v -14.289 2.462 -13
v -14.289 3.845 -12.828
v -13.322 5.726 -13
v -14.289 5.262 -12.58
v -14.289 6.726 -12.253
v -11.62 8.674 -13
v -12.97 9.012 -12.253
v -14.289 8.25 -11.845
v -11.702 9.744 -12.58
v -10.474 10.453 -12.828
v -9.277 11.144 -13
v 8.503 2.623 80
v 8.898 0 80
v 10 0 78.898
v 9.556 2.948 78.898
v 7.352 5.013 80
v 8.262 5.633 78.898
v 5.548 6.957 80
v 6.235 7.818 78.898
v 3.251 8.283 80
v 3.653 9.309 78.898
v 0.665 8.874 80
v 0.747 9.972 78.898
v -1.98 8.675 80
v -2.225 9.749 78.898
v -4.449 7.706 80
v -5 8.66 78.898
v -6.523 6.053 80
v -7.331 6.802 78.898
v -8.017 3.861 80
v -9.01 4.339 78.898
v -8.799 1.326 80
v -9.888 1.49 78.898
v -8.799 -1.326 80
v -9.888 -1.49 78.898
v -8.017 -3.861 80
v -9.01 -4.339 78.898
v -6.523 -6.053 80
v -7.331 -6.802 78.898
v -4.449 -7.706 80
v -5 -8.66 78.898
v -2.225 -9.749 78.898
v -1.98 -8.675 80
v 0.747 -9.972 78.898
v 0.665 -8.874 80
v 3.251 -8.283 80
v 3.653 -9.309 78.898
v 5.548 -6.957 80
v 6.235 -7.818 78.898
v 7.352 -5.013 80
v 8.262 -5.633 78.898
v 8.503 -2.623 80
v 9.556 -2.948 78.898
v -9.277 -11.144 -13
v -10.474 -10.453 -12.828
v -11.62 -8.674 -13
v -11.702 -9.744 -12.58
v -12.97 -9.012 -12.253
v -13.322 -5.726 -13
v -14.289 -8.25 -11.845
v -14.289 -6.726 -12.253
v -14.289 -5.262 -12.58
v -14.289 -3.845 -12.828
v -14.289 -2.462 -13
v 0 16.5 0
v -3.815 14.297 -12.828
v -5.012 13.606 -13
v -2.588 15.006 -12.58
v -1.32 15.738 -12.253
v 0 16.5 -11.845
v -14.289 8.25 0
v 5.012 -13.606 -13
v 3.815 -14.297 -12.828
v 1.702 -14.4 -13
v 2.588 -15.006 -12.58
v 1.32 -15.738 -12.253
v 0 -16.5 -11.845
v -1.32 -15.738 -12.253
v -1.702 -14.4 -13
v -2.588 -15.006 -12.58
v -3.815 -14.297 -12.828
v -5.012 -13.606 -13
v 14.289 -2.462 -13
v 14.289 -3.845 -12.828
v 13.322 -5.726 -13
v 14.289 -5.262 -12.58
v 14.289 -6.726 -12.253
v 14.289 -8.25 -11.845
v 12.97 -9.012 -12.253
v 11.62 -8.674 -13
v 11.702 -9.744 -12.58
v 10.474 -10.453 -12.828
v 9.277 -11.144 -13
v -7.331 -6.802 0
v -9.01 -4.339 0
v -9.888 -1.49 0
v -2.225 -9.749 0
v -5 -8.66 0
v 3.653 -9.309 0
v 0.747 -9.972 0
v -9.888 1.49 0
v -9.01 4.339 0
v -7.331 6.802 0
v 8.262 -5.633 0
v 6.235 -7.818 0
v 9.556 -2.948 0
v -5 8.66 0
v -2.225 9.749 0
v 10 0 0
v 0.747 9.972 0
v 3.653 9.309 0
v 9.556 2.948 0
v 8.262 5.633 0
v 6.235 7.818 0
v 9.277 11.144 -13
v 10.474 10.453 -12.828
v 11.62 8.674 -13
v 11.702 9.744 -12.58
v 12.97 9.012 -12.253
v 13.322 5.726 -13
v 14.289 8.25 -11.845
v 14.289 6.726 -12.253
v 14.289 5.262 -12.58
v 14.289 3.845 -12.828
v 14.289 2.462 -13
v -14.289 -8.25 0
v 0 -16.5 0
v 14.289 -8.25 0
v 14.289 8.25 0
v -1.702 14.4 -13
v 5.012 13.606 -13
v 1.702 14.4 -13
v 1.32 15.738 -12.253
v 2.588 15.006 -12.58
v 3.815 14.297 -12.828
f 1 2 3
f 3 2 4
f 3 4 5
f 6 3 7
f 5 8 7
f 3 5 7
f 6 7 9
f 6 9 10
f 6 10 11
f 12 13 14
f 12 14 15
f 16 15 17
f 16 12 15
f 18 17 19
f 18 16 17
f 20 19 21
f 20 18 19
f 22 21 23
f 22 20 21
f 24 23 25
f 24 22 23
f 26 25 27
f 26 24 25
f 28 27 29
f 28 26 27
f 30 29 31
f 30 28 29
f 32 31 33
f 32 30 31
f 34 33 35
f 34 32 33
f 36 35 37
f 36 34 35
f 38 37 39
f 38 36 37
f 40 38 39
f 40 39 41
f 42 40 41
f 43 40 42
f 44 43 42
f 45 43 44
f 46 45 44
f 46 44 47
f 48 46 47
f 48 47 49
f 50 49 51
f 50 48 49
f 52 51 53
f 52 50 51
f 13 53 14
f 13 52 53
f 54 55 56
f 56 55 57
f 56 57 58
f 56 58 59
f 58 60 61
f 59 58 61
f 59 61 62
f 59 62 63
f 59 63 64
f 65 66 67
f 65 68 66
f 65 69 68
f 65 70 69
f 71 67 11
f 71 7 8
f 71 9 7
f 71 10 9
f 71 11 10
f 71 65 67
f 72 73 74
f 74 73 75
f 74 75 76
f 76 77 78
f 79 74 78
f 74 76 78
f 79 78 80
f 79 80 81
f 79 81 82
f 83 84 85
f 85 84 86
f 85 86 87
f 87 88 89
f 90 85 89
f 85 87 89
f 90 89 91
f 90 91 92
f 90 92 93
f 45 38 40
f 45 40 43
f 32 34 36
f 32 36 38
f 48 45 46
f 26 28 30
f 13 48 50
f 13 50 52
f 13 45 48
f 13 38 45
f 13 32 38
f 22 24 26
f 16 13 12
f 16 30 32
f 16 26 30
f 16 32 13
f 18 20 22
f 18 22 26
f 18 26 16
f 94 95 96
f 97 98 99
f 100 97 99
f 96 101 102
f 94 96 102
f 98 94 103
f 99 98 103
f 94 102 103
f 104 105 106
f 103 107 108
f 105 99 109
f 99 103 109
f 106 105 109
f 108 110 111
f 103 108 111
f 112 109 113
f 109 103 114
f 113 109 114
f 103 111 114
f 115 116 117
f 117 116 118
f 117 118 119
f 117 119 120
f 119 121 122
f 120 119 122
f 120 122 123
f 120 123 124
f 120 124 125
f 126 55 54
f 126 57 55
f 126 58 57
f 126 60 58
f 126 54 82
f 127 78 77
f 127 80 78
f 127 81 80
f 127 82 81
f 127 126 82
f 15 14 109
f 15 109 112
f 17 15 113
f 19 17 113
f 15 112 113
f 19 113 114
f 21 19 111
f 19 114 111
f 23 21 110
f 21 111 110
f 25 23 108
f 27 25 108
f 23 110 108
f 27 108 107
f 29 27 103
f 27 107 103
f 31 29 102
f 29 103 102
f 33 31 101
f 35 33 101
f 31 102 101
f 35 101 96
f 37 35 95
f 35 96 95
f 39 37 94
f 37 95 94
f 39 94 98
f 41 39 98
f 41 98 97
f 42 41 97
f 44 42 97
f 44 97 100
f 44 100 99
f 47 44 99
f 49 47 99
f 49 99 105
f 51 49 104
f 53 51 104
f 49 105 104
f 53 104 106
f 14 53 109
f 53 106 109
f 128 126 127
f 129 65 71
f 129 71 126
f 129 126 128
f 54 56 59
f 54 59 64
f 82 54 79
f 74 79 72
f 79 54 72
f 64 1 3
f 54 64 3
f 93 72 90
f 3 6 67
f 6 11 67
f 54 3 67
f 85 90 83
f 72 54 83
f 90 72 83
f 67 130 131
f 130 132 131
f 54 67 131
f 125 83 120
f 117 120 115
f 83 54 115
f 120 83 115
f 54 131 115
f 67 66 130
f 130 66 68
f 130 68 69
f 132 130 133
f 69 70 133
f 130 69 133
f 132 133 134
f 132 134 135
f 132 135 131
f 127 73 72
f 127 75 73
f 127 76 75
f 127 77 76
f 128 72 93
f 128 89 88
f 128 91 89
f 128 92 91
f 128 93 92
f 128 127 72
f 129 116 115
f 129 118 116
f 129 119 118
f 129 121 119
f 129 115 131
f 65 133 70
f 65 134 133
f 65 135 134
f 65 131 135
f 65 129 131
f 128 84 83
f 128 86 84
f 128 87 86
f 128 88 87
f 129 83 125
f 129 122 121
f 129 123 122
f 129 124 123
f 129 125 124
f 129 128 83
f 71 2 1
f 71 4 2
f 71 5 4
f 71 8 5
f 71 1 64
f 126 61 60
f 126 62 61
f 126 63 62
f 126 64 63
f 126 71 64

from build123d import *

# Parameters (mm, degrees)
SKETCH_1_R      = 10
EXTRUDE_1_DEPTH = 80
EXTRUDE_2_DEPTH = 13
CHAMFER_1_SIZE  = 1.1015


with BuildPart() as part:
    # Эскиз1 → Бобышка-Вытянуть1 (new body)
    with BuildSketch(Plane.XY):
        Circle(SKETCH_1_R)
    extrude(amount=EXTRUDE_1_DEPTH)

    # Фаска1
    chamfer_1_edges = [part.edges().sort_by_distance(p)[0] for p in [
        (-10, 0, 80),
    ]]
    chamfer(chamfer_1_edges, length=CHAMFER_1_SIZE)


with BuildPart() as body_2:
    # Эскиз1<4> → Бобышка-Вытянуть2 (new body)
    with BuildSketch(Plane.XY):
        Polygon((0, 16.5), (-14.289419162, 8.25), (-14.289419162, -8.25), (0, -16.5), (14.289419162, -8.25), (14.289419162, 8.25), align=None)
    extrude(amount=-EXTRUDE_2_DEPTH)

    # Эскиз3 → Вырез-Повернуть1 (revolve, cut)
    with BuildSketch(Plane(origin=(0, 0, 0), x_dir=(0, 0, -1), z_dir=(1, 0, 0))):
        Polygon((13, 24.5), (13, 14.5), (7.226497308, 24.5), align=None)
    revolve(axis=Axis((0, 0, 0), (0, 0, -1)), mode=Mode.SUBTRACT)


solid = Compound([part.part, body_2.part])
